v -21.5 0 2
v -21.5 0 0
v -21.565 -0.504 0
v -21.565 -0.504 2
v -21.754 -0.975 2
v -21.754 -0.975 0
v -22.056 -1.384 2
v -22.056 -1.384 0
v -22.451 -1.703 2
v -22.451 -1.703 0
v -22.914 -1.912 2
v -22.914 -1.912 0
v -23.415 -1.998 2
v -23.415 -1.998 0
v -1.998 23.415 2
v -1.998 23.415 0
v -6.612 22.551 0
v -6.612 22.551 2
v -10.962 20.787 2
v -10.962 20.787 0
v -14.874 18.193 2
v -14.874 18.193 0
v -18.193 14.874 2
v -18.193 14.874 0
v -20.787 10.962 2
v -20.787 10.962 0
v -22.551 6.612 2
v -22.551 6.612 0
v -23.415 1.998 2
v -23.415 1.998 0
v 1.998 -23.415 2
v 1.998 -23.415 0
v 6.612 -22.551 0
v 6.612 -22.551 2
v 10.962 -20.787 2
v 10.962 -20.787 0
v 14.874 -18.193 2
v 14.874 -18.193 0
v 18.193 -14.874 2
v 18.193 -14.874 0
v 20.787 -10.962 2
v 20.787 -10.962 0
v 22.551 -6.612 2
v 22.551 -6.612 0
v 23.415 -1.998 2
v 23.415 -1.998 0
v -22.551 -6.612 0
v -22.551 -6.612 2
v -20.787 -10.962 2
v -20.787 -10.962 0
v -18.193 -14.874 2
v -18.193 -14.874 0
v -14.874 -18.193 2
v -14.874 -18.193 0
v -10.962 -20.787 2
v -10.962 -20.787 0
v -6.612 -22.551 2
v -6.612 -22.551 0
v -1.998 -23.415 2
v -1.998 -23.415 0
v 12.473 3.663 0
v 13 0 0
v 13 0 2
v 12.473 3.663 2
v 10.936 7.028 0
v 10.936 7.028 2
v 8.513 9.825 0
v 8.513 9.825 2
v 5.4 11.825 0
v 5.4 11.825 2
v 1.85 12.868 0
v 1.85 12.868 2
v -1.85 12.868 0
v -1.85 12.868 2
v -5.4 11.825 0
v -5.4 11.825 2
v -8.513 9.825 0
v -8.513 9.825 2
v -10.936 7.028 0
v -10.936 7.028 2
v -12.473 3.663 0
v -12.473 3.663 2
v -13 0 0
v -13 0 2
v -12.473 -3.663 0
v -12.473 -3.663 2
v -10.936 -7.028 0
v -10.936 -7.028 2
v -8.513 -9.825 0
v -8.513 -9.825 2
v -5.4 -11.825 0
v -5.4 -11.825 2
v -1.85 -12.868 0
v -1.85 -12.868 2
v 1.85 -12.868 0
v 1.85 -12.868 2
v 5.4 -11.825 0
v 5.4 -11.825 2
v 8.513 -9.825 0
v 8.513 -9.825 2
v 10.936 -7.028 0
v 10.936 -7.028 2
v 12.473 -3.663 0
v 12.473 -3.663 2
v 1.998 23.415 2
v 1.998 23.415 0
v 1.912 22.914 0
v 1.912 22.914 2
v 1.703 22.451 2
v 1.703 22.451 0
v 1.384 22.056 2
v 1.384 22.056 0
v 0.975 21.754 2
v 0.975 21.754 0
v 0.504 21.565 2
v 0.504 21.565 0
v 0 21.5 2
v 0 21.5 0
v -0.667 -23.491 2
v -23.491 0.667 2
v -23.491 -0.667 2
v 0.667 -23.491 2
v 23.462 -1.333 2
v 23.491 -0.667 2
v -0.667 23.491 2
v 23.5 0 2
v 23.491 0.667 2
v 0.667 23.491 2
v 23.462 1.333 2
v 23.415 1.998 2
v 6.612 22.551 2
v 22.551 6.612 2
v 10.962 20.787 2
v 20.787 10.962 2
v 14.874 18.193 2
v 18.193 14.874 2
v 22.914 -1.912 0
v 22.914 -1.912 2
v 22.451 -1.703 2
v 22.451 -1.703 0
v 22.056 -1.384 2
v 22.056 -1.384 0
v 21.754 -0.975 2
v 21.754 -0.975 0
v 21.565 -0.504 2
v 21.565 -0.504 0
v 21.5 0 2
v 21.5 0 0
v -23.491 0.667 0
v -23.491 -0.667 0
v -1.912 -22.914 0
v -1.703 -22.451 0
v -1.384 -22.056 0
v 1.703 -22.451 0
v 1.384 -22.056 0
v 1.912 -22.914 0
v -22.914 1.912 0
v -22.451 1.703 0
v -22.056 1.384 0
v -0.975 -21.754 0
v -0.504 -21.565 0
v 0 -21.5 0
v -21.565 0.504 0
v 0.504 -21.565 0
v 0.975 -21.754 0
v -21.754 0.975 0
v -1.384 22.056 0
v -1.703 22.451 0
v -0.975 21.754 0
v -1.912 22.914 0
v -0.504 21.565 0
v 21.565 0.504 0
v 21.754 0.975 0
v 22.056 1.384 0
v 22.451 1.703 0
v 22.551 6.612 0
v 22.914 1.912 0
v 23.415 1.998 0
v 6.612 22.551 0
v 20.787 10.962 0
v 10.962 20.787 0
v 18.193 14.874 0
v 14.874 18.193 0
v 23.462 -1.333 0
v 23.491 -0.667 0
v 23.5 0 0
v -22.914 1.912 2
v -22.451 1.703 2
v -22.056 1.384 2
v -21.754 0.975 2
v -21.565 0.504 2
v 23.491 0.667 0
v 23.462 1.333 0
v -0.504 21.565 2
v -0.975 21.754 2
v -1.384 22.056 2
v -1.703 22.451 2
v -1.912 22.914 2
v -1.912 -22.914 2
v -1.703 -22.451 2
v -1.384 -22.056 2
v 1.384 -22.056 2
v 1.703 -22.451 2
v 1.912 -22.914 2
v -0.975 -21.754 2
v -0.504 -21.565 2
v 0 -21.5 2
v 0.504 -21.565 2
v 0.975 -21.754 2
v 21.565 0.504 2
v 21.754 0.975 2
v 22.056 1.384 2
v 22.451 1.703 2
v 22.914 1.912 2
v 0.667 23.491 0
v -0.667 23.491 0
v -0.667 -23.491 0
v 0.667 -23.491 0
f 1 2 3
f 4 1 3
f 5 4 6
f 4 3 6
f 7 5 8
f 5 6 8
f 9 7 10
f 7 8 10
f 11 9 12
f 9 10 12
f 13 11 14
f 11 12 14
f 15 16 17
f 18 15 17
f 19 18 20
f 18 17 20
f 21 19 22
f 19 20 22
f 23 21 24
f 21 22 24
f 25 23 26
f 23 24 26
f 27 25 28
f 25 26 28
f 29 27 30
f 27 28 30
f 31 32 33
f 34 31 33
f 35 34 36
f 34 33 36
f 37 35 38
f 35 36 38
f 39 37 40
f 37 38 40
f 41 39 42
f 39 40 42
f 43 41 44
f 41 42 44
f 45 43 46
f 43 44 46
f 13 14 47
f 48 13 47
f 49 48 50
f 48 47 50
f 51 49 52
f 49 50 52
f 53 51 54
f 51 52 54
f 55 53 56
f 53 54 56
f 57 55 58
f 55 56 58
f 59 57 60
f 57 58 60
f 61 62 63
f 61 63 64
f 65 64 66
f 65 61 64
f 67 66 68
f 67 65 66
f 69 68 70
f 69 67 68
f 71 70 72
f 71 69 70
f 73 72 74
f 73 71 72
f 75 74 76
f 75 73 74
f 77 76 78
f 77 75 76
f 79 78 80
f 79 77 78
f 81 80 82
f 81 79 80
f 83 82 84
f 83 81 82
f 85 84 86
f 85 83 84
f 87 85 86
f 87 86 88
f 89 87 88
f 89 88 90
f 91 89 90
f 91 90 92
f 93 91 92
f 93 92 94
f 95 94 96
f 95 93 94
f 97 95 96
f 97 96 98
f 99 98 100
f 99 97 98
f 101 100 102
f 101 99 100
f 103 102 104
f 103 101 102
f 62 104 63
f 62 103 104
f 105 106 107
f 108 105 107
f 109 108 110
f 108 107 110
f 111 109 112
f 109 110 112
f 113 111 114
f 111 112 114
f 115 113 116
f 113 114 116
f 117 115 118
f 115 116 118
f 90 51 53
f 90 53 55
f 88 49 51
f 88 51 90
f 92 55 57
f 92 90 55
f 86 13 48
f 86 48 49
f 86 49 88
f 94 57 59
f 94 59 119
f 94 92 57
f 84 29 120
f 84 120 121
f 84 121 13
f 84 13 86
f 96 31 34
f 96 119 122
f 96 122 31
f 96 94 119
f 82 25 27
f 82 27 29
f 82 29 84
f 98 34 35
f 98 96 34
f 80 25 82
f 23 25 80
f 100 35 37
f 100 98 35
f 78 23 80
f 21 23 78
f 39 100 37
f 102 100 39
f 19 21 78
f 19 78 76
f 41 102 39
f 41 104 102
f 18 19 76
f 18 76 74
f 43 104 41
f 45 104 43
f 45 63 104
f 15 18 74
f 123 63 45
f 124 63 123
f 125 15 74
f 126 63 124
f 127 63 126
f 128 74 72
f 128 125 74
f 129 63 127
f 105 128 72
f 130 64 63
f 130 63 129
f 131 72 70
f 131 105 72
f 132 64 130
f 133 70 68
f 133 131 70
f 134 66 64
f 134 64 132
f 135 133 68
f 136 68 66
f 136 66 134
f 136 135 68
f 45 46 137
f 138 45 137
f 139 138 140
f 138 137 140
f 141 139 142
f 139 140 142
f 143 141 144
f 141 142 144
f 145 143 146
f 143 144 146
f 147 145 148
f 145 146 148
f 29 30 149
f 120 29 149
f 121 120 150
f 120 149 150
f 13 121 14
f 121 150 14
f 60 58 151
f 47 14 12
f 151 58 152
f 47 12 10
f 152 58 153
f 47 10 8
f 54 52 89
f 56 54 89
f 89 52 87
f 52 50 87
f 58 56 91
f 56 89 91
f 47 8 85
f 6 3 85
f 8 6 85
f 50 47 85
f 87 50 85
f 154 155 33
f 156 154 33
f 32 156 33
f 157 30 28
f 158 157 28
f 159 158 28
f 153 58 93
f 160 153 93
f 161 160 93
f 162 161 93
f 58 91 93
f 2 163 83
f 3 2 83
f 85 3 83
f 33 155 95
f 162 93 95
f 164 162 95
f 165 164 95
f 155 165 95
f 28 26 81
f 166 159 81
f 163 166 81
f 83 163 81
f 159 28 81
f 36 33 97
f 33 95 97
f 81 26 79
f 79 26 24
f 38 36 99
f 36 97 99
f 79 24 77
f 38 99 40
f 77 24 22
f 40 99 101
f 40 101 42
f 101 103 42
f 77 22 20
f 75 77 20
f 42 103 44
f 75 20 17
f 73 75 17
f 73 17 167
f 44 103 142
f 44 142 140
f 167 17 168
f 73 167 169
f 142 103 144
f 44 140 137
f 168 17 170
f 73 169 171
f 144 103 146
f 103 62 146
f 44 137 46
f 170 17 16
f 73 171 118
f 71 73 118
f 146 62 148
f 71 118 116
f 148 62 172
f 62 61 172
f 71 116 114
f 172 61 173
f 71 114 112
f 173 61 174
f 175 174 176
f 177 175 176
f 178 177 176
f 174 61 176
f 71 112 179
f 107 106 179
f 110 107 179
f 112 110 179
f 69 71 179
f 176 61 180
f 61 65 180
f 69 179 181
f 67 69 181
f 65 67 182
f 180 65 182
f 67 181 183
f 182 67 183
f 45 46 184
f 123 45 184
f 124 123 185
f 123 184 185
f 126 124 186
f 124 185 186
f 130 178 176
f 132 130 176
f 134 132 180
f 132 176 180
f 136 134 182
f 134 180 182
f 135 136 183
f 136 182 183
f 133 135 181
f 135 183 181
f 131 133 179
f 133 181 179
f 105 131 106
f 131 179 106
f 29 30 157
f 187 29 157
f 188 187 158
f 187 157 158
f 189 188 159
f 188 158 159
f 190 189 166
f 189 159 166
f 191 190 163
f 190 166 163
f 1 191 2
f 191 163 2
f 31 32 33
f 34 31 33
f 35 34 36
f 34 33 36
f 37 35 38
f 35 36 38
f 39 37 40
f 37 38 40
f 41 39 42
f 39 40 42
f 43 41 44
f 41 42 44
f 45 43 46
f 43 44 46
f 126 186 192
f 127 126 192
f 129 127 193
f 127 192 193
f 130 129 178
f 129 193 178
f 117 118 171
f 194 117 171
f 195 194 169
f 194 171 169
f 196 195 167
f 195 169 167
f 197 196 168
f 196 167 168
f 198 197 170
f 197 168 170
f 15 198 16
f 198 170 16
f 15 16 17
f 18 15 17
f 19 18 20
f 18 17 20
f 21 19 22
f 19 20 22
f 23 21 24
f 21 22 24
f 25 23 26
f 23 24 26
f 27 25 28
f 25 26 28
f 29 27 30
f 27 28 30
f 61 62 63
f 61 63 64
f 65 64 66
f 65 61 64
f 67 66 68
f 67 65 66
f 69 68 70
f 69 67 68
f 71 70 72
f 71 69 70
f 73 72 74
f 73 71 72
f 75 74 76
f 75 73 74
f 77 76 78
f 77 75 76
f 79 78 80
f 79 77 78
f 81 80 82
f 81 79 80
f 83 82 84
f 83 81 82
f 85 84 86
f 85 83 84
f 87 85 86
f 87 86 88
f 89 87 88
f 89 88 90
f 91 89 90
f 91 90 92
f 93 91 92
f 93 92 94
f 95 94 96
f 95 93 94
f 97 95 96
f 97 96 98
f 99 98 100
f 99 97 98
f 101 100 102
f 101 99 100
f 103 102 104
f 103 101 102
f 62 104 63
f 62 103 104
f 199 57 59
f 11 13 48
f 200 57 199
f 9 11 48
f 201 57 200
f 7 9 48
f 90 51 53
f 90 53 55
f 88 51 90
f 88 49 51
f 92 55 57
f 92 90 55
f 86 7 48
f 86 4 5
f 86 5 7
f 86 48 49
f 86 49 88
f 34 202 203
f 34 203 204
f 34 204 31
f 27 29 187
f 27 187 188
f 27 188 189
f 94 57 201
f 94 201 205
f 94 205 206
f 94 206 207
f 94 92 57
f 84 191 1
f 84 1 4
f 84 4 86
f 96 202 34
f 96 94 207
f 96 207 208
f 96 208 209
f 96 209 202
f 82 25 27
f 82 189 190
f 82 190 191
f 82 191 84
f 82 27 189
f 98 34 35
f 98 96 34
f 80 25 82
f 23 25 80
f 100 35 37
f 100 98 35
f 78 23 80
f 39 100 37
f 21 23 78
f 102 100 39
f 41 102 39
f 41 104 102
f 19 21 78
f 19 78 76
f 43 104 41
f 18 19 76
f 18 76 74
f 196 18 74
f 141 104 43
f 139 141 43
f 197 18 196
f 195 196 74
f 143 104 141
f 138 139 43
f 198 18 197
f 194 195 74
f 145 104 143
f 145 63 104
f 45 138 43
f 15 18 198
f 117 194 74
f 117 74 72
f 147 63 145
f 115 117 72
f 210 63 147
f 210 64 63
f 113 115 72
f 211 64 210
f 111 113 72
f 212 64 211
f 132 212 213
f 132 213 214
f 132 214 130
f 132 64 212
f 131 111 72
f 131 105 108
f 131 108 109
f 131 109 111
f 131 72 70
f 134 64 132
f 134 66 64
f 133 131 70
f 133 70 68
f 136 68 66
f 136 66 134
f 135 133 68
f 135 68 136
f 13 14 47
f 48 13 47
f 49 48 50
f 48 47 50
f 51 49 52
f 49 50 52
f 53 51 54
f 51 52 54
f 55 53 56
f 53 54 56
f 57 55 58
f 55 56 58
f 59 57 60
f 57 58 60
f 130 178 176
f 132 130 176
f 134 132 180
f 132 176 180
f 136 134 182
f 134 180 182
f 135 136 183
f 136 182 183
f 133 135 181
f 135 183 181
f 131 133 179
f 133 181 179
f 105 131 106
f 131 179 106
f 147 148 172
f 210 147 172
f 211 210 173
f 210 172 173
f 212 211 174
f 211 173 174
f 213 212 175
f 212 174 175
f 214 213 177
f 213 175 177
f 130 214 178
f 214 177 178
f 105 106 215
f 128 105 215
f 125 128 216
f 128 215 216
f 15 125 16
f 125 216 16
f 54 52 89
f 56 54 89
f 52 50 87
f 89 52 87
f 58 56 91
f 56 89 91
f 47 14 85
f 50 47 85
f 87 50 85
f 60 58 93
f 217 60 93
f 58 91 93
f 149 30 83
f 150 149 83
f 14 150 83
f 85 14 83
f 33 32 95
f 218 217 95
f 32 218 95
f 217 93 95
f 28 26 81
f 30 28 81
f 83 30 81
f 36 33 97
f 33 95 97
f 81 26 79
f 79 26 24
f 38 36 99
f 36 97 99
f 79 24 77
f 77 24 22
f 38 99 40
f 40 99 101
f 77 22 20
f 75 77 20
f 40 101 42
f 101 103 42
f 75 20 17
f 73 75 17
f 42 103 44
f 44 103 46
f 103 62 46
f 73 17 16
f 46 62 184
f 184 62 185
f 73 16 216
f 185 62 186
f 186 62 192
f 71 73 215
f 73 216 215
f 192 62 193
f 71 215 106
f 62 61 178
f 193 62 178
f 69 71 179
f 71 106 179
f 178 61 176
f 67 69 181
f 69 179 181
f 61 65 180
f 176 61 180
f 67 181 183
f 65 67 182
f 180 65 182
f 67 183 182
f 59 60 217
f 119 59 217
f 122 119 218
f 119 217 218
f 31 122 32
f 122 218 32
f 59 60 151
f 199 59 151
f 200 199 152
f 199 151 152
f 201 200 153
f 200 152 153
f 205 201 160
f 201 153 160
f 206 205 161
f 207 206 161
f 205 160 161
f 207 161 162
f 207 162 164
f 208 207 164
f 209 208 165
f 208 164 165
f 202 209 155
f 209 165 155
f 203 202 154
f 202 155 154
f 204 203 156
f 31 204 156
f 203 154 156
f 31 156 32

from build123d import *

# Parameters (mm, degrees)
F0_R     = 13
F1_DEPTH = 2
F2_DEPTH = 2


# Not quite as in the source:
# - a feature names something its author has since deleted; it is built from what else it names


with BuildPart() as f1:
    # F0 (on Top) → F1 (new body)
    with BuildSketch(Plane.XY):
        with BuildLine():
            ThreePointArc((21.5, 0), (22.0560102552, 1.383796812), (23.414893617, 1.9981884054))
            ThreePointArc((23.414893617, 1.9981884054), (16.6170093579, 16.6170093579), (1.9981884054, 23.414893617))
            ThreePointArc((1.9981884054, 23.414893617), (1.3837968027, 22.0560102463), (-2.58e-08, 21.5))
            ThreePointArc((-2.58e-08, 21.5), (15.2027957864, 15.2027958046), (21.5, 0))
        make_face()
        with BuildLine():
            ThreePointArc((-2.58e-08, 21.5), (1.3837968027, 22.0560102463), (1.9981884054, 23.414893617))
            ThreePointArc((1.9981884054, 23.414893617), (0, 23.5), (-1.9981884054, 23.414893617))
            ThreePointArc((-1.9981884054, 23.414893617), (-1.3837968214, 22.0560102642), (-2.58e-08, 21.5))
        make_face()
        with BuildLine():
            ThreePointArc((-2.58e-08, 21.5), (-1.3837968214, 22.0560102642), (-1.9981884054, 23.414893617))
            ThreePointArc((-1.9981884054, 23.414893617), (-16.6170093579, 16.6170093579), (-23.414893617, 1.9981884054))
            ThreePointArc((-23.414893617, 1.9981884054), (-22.0560102552, 1.383796812), (-21.5, 0))
            ThreePointArc((-21.5, 0), (-15.2027958046, 15.2027957864), (-2.58e-08, 21.5))
        make_face()
        with BuildLine():
            ThreePointArc((-21.5, 0), (-22.0560102552, 1.383796812), (-23.414893617, 1.9981884054))
            ThreePointArc((-23.414893617, 1.9981884054), (-23.5, 0), (-23.414893617, -1.9981884054))
            ThreePointArc((-23.414893617, -1.9981884054), (-22.0560102552, -1.383796812), (-21.5, 0))
        make_face()
        with BuildLine():
            ThreePointArc((-1.9981884054, -23.414893617), (-1.3837968124, -22.0560102556), (-1.1e-09, -21.5))
            ThreePointArc((-1.1e-09, -21.5), (-15.2027957959, -15.2027957951), (-21.5, 0))
            ThreePointArc((-21.5, 0), (-22.0560102552, -1.383796812), (-23.414893617, -1.9981884054))
            ThreePointArc((-23.414893617, -1.9981884054), (-16.6170093579, -16.6170093579), (-1.9981884054, -23.414893617))
        make_face()
        with BuildLine():
            ThreePointArc((-1.9981884054, -23.414893617), (0, -23.5), (1.9981884054, -23.414893617))
            ThreePointArc((1.9981884054, -23.414893617), (1.3837968117, -22.0560102549), (-1.1e-09, -21.5))
            ThreePointArc((-1.1e-09, -21.5), (-1.3837968124, -22.0560102556), (-1.9981884054, -23.414893617))
        make_face()
        with BuildLine():
            ThreePointArc((1.9981884054, -23.414893617), (16.6170093579, -16.6170093579), (23.414893617, -1.9981884054))
            ThreePointArc((23.414893617, -1.9981884054), (22.0560102552, -1.383796812), (21.5, 0))
            ThreePointArc((21.5, 0), (15.2027957951, -15.2027957959), (-1.1e-09, -21.5))
            ThreePointArc((-1.1e-09, -21.5), (1.3837968117, -22.0560102549), (1.9981884054, -23.414893617))
        make_face()
        with BuildLine():
            ThreePointArc((23.414893617, -1.9981884054), (23.4787137637, -1), (23.5, 0))
            ThreePointArc((23.5, 0), (23.4787137637, 1), (23.414893617, 1.9981884054))
            ThreePointArc((23.414893617, 1.9981884054), (22.0560102552, 1.383796812), (21.5, 0))
            ThreePointArc((21.5, 0), (22.0560102552, -1.383796812), (23.414893617, -1.9981884054))
        make_face()
        with BuildLine():
            ThreePointArc((-1.1e-09, -21.5), (15.2027957951, -15.2027957959), (21.5, 0))
            ThreePointArc((21.5, 0), (15.2027957864, 15.2027958046), (-2.58e-08, 21.5))
            ThreePointArc((-2.58e-08, 21.5), (-15.2027958046, 15.2027957864), (-21.5, 0))
            ThreePointArc((-21.5, 0), (-15.2027957959, -15.2027957951), (-1.1e-09, -21.5))
        make_face()
        Circle(F0_R, mode=Mode.SUBTRACT)
    extrude(amount=F1_DEPTH)


with BuildPart() as f2:
    # F0 (on Top) → F2 (new body)
    with BuildSketch(Plane.XY):
        with BuildLine():
            ThreePointArc((-1.1e-09, -21.5), (15.2027957951, -15.2027957959), (21.5, 0))
            ThreePointArc((21.5, 0), (15.2027957864, 15.2027958046), (-2.58e-08, 21.5))
            ThreePointArc((-2.58e-08, 21.5), (-15.2027958046, 15.2027957864), (-21.5, 0))
            ThreePointArc((-21.5, 0), (-15.2027957959, -15.2027957951), (-1.1e-09, -21.5))
        make_face()
        Circle(F0_R, mode=Mode.SUBTRACT)
        with BuildLine():
            ThreePointArc((-1.9981884054, -23.414893617), (-1.3837968124, -22.0560102556), (-1.1e-09, -21.5))
            ThreePointArc((-1.1e-09, -21.5), (-15.2027957959, -15.2027957951), (-21.5, 0))
            ThreePointArc((-21.5, 0), (-22.0560102552, -1.383796812), (-23.414893617, -1.9981884054))
            ThreePointArc((-23.414893617, -1.9981884054), (-16.6170093579, -16.6170093579), (-1.9981884054, -23.414893617))
        make_face()
        with BuildLine():
            ThreePointArc((-2.58e-08, 21.5), (-1.3837968214, 22.0560102642), (-1.9981884054, 23.414893617))
            ThreePointArc((-1.9981884054, 23.414893617), (-16.6170093579, 16.6170093579), (-23.414893617, 1.9981884054))
            ThreePointArc((-23.414893617, 1.9981884054), (-22.0560102552, 1.383796812), (-21.5, 0))
            ThreePointArc((-21.5, 0), (-15.2027958046, 15.2027957864), (-2.58e-08, 21.5))
        make_face()
        with BuildLine():
            ThreePointArc((1.9981884054, -23.414893617), (16.6170093579, -16.6170093579), (23.414893617, -1.9981884054))
            ThreePointArc((23.414893617, -1.9981884054), (22.0560102552, -1.383796812), (21.5, 0))
            ThreePointArc((21.5, 0), (15.2027957951, -15.2027957959), (-1.1e-09, -21.5))
            ThreePointArc((-1.1e-09, -21.5), (1.3837968117, -22.0560102549), (1.9981884054, -23.414893617))
        make_face()
        with BuildLine():
            ThreePointArc((21.5, 0), (22.0560102552, 1.383796812), (23.414893617, 1.9981884054))
            ThreePointArc((23.414893617, 1.9981884054), (16.6170093579, 16.6170093579), (1.9981884054, 23.414893617))
            ThreePointArc((1.9981884054, 23.414893617), (1.3837968027, 22.0560102463), (-2.58e-08, 21.5))
            ThreePointArc((-2.58e-08, 21.5), (15.2027957864, 15.2027958046), (21.5, 0))
        make_face()
    extrude(amount=F2_DEPTH)


solid = Compound([f1.part, f2.part])
